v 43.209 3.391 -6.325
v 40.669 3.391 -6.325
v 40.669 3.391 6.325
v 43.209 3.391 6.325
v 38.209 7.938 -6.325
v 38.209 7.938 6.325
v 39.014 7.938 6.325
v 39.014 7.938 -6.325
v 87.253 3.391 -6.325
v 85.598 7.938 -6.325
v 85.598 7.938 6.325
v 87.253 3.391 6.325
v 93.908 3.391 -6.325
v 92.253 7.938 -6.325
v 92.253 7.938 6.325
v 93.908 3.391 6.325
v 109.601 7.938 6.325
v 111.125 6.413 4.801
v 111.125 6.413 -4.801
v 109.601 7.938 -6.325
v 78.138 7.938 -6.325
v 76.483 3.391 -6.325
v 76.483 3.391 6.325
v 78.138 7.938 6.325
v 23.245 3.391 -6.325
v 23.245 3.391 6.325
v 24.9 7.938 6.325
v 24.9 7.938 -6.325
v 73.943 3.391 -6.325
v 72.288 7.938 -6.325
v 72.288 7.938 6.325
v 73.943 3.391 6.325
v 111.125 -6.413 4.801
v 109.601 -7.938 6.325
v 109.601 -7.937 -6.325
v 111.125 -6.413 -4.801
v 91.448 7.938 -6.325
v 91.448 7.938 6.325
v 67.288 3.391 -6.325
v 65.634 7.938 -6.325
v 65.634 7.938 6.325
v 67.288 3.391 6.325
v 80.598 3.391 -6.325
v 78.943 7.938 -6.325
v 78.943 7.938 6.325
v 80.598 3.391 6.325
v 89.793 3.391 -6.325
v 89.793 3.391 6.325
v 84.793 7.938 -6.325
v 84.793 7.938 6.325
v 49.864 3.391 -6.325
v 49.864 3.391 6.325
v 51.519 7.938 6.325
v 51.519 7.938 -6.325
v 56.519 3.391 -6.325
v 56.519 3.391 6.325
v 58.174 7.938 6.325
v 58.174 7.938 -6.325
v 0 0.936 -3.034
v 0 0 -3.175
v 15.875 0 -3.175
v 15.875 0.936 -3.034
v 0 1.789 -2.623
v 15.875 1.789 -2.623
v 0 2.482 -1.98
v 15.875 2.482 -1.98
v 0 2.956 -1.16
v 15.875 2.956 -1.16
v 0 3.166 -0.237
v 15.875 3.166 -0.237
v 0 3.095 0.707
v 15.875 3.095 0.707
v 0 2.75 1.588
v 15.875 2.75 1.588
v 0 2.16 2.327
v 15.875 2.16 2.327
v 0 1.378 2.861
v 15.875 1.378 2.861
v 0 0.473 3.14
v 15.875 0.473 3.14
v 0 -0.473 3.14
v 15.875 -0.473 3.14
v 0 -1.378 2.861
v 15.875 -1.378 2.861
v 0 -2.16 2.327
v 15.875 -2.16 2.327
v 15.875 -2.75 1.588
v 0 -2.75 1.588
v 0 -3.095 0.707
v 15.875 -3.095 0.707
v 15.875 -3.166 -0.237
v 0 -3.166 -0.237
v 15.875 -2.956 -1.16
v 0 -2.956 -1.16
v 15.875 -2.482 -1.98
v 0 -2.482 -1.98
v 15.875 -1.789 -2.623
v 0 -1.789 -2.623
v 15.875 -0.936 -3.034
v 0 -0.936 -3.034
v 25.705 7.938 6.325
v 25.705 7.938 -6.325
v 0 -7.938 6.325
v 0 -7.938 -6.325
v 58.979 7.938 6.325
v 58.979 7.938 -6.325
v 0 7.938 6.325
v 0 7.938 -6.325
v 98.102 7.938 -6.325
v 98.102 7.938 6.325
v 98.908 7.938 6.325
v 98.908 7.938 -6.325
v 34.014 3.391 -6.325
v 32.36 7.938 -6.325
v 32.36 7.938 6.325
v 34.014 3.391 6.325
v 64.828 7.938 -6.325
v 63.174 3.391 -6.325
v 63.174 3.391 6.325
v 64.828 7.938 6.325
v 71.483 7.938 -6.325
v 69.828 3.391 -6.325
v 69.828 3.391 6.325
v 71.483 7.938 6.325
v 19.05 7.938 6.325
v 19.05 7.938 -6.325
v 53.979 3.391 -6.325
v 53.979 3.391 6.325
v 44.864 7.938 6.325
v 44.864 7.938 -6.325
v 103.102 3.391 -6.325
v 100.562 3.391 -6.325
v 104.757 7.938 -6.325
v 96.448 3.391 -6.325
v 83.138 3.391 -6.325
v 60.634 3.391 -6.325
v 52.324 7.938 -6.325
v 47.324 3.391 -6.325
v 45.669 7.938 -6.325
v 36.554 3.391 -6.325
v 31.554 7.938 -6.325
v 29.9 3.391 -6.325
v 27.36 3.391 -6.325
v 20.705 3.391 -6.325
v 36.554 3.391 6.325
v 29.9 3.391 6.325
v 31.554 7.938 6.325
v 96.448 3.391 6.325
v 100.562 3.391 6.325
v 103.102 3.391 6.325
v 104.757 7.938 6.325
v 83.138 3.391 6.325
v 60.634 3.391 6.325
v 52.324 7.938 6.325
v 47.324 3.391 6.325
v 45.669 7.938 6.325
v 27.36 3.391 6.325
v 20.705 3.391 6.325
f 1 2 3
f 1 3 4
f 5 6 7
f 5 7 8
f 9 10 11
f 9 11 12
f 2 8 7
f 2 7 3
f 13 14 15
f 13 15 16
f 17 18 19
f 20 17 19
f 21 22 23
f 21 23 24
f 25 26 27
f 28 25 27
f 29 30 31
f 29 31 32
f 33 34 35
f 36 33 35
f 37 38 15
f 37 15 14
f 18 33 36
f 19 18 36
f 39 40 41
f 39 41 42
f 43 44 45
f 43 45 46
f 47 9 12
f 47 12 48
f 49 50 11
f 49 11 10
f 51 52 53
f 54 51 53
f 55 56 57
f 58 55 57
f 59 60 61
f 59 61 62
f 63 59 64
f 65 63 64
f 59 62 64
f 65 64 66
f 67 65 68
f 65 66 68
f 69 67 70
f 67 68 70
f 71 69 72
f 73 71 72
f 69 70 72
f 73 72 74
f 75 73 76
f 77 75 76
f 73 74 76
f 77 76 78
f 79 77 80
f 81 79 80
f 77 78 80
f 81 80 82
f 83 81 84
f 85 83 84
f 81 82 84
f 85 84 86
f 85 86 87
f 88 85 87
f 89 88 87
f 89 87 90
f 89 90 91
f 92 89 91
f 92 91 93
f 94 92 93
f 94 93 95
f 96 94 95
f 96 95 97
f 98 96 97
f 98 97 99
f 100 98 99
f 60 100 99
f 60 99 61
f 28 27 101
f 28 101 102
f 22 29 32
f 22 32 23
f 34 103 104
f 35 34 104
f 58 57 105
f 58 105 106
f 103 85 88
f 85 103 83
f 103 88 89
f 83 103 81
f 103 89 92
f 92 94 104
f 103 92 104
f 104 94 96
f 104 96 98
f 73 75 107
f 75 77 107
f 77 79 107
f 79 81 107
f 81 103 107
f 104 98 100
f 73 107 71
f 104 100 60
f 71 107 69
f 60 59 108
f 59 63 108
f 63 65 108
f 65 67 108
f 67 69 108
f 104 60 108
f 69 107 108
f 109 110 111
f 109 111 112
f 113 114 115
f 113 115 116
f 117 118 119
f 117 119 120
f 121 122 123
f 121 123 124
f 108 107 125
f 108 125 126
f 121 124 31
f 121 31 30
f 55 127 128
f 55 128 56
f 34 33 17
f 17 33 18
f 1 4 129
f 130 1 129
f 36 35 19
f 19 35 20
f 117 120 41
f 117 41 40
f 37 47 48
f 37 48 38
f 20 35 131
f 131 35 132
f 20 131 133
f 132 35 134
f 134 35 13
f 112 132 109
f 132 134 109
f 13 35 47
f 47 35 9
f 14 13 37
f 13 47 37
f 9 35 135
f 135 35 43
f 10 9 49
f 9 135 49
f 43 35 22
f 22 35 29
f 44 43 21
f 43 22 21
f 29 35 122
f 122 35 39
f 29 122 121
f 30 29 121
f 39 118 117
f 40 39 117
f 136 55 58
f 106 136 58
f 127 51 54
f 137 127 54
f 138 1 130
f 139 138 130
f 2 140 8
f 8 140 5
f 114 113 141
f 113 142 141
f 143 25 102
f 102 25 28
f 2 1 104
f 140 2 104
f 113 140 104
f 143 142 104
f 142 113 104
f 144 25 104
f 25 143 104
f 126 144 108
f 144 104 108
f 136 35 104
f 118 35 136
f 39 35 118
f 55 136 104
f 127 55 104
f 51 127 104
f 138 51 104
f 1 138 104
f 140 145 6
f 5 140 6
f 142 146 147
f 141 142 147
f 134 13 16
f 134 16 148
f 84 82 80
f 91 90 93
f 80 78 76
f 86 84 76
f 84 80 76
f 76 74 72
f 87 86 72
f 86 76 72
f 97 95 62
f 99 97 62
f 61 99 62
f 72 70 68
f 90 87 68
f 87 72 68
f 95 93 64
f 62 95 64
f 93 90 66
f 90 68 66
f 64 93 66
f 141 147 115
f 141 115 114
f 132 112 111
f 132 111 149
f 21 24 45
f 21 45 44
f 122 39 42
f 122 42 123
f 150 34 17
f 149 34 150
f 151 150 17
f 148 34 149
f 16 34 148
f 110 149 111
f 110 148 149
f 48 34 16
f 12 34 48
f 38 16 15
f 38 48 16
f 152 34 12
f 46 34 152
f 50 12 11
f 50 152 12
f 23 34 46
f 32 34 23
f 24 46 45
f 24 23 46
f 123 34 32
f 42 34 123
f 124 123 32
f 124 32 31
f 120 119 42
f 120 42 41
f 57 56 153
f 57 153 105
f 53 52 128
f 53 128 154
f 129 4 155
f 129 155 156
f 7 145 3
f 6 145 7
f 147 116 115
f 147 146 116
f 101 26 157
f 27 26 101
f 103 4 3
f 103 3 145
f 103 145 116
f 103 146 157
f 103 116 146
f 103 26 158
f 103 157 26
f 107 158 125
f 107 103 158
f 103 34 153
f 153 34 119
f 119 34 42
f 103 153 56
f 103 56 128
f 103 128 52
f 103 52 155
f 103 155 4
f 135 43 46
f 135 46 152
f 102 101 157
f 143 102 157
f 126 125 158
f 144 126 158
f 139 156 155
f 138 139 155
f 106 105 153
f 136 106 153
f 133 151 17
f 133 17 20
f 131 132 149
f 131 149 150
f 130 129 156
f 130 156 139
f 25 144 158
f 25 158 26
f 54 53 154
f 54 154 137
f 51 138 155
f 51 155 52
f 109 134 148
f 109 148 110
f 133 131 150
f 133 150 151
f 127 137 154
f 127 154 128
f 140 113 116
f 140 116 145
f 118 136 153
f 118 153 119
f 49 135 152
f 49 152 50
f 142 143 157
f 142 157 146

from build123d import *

# Parameters (mm, degrees)
SKETCH1_W           = 12.6492
SKETCH1_H           = 15.875
BOSS_EXTRUDE1_DEPTH = 111.125
HOLE1_D             = 6.35
HOLE1_DEPTH         = 15.875
CUT_EXTRUDE1_START  = -13.6492
CUT_EXTRUDE1_DEPTH  = 14.6492
LPATTERN2_COUNT     = 13
LPATTERN2_PITCH     = 6.6548
CHAMFER1_SIZE       = 1.524


with BuildPart() as part:
    # Sketch1 → Boss-Extrude1 (new body)
    with BuildSketch(Plane(origin=(0, 0, 0), x_dir=(0, 0, -1), z_dir=(1, 0, 0))):
        Rectangle(SKETCH1_W, SKETCH1_H)
    extrude(amount=BOSS_EXTRUDE1_DEPTH)

    # Hole1
    with Locations(Plane.ZY):
        with Locations((0, 0)):
            Hole(HOLE1_D / 2, depth=HOLE1_DEPTH)

    # Sketch4 → Cut-Extrude1 (cut)
    with BuildSketch(Plane.XY.offset(6.3246).offset(CUT_EXTRUDE1_START)):
        Polygon((-48.282488077, 192.931990587), (19.05, 7.9375), (20.704827067, 3.3909), (23.244827067, 3.3909), (24.899654134, 7.9375), (92.232142211, 192.931990587), (92.232142211, 586.666040414), (-48.282488077, 586.666040414), align=None)
    cut_extrude1 = extrude(amount=CUT_EXTRUDE1_DEPTH, mode=Mode.SUBTRACT)

    # LPattern2: Cut-Extrude1 ×13
    with Locations(*[(i * LPATTERN2_PITCH, 0, 0) for i in range(1, LPATTERN2_COUNT)]):
        add(cut_extrude1, mode=Mode.SUBTRACT)

    # Chamfer1
    chamfer1_edges = [part.edges().sort_by_distance(p)[0] for p in [
        (111.125, 0, 6.3246),
        (111.125, -7.9375, 0),
        (111.125, 0, -6.3246),
        (111.125, 7.9375, 0),
    ]]
    chamfer(chamfer1_edges, length=CHAMFER1_SIZE)


solid = part.part
